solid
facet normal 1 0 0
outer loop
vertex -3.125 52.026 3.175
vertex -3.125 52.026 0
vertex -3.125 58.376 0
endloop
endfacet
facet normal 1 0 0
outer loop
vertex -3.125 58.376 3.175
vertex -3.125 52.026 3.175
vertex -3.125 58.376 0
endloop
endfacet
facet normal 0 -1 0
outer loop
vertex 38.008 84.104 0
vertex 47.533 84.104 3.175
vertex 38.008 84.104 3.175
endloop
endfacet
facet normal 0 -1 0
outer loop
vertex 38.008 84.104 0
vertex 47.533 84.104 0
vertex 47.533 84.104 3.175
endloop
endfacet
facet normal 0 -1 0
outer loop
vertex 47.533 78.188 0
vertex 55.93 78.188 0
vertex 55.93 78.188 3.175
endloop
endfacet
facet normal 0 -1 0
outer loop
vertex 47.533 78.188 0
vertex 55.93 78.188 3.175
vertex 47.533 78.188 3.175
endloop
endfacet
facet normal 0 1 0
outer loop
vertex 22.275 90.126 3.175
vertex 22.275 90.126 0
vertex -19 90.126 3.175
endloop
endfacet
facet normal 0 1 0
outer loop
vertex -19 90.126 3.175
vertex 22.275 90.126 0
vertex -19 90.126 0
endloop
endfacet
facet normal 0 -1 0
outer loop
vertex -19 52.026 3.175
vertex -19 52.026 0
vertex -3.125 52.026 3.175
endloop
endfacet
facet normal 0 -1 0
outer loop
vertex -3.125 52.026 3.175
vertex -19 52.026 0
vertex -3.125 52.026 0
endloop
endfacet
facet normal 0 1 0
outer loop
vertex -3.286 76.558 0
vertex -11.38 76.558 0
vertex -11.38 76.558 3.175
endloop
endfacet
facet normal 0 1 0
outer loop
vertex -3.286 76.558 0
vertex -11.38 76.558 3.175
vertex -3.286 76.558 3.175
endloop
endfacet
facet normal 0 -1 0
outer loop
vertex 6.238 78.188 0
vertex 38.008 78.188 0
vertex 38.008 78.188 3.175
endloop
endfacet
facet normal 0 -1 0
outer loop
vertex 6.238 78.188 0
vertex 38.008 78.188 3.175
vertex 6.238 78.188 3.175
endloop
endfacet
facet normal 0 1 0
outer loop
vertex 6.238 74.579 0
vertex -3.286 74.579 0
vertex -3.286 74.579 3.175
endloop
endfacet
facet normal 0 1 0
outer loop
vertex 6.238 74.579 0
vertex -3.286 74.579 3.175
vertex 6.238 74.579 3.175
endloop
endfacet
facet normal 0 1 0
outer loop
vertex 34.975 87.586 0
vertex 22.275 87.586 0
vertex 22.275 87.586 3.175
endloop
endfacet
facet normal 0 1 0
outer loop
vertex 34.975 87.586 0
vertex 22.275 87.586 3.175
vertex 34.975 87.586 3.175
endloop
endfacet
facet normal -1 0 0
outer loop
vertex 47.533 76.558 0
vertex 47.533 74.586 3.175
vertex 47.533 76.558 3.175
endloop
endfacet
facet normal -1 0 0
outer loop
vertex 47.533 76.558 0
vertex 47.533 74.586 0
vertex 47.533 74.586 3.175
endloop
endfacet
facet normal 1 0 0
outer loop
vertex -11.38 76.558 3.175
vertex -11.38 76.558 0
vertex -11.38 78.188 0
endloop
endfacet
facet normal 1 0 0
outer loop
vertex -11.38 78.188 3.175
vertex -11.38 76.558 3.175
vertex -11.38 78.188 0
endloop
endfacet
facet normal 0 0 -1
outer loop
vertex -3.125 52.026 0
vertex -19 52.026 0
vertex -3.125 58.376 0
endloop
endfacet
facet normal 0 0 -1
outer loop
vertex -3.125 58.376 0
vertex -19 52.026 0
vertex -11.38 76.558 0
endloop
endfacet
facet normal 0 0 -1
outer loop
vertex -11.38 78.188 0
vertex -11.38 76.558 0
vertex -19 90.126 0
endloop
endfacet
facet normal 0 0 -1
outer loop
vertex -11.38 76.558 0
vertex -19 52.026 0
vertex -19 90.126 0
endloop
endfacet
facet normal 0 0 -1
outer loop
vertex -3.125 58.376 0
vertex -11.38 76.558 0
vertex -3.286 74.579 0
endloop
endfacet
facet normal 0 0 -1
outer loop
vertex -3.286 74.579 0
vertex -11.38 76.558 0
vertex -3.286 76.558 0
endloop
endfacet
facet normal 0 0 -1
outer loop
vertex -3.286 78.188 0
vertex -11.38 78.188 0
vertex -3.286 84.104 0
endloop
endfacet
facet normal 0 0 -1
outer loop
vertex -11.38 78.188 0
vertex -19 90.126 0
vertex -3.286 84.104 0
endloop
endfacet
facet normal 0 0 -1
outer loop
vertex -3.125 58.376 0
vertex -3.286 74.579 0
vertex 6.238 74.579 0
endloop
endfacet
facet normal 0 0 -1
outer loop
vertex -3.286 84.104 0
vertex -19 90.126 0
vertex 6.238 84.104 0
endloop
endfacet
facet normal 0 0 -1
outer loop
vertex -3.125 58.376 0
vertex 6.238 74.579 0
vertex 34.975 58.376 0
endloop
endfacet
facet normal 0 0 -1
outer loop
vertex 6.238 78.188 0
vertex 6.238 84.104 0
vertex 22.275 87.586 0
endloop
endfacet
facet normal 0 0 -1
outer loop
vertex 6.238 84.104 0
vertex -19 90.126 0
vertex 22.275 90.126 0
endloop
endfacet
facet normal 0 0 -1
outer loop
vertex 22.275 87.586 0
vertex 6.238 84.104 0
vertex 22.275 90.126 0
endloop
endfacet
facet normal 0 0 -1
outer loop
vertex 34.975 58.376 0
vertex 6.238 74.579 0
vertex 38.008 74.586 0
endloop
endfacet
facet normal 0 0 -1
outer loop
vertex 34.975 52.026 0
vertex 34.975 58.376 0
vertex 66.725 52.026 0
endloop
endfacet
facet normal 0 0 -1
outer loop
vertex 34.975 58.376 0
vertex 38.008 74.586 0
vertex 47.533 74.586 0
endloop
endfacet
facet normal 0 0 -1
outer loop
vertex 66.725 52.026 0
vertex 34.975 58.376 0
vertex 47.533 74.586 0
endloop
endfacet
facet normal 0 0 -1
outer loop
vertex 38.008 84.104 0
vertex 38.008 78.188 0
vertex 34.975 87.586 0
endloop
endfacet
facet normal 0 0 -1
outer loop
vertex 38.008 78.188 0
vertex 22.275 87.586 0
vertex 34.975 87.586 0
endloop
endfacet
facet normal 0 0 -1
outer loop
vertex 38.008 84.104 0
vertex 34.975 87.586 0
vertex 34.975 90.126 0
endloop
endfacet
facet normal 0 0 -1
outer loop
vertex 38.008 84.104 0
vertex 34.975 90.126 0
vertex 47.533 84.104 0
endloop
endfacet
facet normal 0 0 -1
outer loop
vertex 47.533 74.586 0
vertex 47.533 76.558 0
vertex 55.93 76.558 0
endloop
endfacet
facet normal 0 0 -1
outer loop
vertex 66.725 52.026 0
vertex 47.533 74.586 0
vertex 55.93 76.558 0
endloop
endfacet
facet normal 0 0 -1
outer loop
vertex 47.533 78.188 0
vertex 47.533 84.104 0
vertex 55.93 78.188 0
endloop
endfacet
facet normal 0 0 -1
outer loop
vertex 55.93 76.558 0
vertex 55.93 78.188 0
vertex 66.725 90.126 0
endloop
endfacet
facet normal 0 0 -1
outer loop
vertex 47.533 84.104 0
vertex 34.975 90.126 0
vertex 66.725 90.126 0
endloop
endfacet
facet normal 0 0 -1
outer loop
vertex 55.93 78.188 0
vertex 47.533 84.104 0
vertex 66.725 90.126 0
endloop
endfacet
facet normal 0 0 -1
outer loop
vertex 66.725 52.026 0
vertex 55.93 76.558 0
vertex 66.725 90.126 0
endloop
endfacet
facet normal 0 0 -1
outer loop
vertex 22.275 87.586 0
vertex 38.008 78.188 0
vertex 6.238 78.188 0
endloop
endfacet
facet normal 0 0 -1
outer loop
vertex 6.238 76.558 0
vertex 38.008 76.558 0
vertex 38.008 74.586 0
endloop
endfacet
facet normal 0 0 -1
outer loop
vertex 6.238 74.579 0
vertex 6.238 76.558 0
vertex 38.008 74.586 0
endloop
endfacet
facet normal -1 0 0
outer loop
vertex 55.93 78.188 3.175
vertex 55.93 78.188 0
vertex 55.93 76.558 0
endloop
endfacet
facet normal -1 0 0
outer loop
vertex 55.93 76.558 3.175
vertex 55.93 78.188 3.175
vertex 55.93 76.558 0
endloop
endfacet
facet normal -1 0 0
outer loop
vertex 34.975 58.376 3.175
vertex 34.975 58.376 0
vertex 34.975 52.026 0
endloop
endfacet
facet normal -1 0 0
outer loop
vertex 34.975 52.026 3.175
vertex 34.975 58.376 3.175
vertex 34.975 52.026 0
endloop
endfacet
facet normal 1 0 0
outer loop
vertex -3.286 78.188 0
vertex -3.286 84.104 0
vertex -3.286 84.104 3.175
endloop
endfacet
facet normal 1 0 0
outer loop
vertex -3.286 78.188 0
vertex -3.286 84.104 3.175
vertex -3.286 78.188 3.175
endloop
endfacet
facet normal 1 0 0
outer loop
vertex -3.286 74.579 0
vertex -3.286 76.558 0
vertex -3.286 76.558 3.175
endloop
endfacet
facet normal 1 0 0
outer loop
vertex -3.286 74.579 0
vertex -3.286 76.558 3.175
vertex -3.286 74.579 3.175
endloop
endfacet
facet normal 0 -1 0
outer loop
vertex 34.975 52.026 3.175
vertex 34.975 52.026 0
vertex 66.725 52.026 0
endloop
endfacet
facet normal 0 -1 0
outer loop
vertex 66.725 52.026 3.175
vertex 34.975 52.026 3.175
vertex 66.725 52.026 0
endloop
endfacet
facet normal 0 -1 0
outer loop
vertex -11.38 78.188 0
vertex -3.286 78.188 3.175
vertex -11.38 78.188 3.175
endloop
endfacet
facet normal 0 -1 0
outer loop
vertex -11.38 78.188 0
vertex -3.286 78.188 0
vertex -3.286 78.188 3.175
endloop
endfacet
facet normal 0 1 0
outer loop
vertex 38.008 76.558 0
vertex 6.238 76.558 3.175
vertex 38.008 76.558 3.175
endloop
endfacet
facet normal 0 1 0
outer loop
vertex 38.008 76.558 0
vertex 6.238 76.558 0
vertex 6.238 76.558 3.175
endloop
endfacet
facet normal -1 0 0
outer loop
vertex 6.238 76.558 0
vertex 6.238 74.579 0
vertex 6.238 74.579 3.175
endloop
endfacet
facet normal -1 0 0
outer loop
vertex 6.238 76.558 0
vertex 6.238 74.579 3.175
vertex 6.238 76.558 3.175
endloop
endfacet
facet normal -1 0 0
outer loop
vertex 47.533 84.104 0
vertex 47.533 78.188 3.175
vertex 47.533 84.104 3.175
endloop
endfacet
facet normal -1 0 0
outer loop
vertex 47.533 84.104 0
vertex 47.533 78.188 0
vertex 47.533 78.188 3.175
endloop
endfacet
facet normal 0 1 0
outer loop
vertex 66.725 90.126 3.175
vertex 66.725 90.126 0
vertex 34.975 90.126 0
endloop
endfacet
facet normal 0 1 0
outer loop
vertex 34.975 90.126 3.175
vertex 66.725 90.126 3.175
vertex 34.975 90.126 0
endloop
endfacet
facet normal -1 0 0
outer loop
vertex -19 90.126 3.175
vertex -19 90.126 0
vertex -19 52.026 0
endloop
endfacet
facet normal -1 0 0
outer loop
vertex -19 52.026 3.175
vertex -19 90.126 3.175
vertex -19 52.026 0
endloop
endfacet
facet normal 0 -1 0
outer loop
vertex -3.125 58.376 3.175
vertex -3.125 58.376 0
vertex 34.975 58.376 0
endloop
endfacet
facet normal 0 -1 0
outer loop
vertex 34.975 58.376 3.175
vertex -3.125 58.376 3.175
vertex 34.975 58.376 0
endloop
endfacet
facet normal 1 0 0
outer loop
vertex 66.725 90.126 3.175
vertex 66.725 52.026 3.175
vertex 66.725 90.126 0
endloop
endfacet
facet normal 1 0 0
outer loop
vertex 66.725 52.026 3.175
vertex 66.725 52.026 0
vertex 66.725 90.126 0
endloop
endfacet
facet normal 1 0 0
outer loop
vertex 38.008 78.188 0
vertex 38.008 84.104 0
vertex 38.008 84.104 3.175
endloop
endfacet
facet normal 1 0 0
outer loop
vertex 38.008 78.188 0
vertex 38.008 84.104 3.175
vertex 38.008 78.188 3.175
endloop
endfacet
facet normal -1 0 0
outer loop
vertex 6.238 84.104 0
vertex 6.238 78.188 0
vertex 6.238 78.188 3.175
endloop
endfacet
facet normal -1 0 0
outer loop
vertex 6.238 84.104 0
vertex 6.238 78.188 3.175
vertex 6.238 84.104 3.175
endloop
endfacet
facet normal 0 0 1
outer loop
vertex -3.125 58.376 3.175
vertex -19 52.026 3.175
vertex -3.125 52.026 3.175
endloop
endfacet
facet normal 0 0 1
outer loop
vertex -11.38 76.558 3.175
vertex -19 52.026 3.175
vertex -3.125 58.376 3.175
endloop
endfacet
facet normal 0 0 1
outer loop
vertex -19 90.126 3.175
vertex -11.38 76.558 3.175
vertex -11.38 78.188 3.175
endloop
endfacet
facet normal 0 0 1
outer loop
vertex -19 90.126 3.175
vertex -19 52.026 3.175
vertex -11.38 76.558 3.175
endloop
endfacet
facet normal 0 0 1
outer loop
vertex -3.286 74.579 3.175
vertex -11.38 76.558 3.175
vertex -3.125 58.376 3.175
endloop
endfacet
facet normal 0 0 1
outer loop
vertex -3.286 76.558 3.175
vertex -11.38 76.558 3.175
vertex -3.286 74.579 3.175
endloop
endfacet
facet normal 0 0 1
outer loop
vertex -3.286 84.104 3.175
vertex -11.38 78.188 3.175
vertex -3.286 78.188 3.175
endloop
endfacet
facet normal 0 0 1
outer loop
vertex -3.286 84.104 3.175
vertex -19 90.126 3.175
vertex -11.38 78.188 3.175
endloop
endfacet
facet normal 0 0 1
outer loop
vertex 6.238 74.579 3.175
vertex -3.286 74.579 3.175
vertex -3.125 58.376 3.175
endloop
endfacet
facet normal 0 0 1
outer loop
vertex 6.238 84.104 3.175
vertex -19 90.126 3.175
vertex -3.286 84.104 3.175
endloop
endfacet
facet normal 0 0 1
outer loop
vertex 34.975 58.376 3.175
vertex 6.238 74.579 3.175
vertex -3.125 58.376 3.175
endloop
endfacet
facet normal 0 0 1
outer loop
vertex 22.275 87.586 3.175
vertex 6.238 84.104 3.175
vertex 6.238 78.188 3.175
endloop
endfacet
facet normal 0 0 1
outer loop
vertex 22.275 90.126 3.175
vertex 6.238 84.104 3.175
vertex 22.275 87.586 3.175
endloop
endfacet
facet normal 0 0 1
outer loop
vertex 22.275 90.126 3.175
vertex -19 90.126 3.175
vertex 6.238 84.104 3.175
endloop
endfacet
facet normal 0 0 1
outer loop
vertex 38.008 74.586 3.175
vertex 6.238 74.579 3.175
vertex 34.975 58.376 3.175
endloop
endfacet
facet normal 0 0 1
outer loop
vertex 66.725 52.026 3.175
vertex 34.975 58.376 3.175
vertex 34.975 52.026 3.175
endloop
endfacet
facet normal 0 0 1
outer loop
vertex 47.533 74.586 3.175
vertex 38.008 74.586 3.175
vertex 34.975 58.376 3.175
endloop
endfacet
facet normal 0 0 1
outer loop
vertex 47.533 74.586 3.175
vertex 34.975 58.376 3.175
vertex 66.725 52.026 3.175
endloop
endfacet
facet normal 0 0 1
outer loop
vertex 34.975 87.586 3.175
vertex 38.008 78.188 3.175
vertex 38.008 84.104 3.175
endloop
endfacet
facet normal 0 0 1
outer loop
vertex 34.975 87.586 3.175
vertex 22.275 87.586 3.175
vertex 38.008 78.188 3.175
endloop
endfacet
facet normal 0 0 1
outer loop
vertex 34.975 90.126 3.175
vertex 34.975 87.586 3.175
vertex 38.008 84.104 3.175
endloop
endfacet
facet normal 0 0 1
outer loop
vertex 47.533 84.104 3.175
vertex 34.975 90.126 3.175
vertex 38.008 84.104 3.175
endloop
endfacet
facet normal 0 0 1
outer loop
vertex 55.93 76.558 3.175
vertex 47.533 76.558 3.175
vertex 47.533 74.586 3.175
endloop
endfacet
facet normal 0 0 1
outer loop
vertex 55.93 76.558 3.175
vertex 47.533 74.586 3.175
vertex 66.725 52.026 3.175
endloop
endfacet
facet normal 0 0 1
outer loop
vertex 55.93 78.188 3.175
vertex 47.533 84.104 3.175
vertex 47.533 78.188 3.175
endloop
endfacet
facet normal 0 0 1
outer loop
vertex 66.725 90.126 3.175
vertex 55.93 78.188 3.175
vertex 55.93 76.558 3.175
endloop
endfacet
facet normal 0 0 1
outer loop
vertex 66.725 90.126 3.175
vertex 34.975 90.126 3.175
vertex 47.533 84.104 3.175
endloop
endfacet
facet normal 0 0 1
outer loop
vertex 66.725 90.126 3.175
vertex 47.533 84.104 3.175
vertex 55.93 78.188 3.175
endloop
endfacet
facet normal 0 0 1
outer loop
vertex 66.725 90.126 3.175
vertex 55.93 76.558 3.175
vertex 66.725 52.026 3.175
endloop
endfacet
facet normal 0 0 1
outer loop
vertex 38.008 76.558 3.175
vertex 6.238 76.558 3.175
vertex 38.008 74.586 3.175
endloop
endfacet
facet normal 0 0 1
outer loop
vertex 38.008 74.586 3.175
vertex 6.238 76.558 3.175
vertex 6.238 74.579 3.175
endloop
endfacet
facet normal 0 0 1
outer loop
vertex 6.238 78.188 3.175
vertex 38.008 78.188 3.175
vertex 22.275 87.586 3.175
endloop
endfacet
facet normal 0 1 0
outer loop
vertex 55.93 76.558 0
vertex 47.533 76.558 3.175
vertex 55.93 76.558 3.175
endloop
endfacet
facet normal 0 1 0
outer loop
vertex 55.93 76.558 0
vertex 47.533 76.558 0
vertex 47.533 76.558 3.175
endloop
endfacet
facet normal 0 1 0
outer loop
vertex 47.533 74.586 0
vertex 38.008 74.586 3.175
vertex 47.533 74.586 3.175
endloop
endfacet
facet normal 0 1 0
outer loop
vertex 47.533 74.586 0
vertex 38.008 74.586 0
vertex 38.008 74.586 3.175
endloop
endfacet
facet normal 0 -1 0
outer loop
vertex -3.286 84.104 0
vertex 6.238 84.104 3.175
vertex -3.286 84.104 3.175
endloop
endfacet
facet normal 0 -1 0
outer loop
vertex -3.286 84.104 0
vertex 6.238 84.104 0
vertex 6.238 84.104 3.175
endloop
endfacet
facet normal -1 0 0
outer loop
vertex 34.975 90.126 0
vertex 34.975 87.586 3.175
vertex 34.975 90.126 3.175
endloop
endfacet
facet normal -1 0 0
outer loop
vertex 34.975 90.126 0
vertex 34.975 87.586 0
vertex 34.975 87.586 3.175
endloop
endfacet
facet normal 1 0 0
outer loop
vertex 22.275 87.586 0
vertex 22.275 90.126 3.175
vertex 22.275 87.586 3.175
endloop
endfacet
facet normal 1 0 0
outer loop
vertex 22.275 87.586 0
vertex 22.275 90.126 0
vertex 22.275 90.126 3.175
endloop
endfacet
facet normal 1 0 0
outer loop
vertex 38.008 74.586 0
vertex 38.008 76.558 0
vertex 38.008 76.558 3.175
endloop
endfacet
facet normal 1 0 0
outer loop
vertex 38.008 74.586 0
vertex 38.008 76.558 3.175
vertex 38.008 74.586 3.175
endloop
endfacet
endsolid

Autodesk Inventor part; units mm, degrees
ref_plane "YZ Plane" through (0, 0, 0) normal (1, 0, 0) x (0, 1, 0)
ref_plane "XZ Plane" through (0, 0, 0) normal (0, 1, 0) x (-1, 0, 0)
ref_plane "XY Plane" through (0, 0, 0) normal (0, 0, 1) x (1, 0, 0)
sketch "Sketch1" plane through (0, 0, 0) normal (0, 0, 1) x (1, 0, 0)
  line L0 (66.7253, 90.1264) -> (-18.9997, 90.1264)
  line L1 (-18.9997, 90.1264) -> (-18.9997, 52.0264)
  line L2 (-18.9997, 52.0264) -> (66.7253, 52.0264)
  line L3 (66.7253, 52.0264) -> (66.7253, 90.1264)
  line L4 (66.7253, 78.1884) -> (-18.9997, 78.1884)
  line L5 (-18.9997, 78.1884) -> (-18.9997, 76.5584)
  line L6 (-18.9997, 76.5584) -> (66.7253, 76.5584)
  line L7 (66.7253, 76.5584) -> (66.7253, 78.1884)
  line L8 (55.9303, 78.1884) -> (55.9303, 76.5584)
  line L9 (-11.3797, 76.5584) -> (-11.3797, 78.1884)
  point P0 (0, 0)
  dimension "d0" = 38.1
  dimension "d1" = 85.725
  dimension "d2" = 1.63
  dimension "d3" = 11.938
  dimension "d6" = 67.31
  dimension "d7" = 7.62
extrude "Extrusion1" add sketch "Sketch1" along normal blind 3.175 contours L3 L4 L1 L0 | L3 L6 L8 L4 | L4 L9 L6 L1 | L3 L2 L1 L6
sketch "Sketch2" plane through (0, 0, 0) normal (0, 0, -1) x (-1, 0, 0)
  line L0 (-55.9303, 78.1884) -> (11.3797, 78.1884) projected
  line L1 (11.3797, 78.1884) -> (11.3797, 76.5584) projected
  line L2 (-6.2385, 84.1043) -> (3.2865, 84.1043)
  line L3 (3.2865, 84.1043) -> (3.2865, 74.5793)
  line L4 (3.2865, 74.5793) -> (-6.2385, 74.5793)
  line L5 (-6.2385, 74.5793) -> (-6.2385, 84.1043)
  line L6 (-47.533, 84.1043) -> (-38.008, 84.1043)
  line L7 (-38.008, 84.1043) -> (-38.008, 74.5865)
  line L8 (-38.008, 74.5865) -> (-47.533, 74.5865)
  line L9 (-47.533, 74.5865) -> (-47.533, 84.1043)
  line L10 (18.9997, 52.0264) -> (-66.7253, 52.0264) projected
  line L11 (-34.9753, 52.0264) -> (3.1247, 52.0264)
  line L12 (3.1247, 52.0264) -> (3.1247, 58.3764)
  line L13 (3.1247, 58.3764) -> (-34.9753, 58.3764)
  line L14 (-34.9753, 58.3764) -> (-34.9753, 52.0264)
  line L15 (-66.7253, 52.0264) -> (-66.7253, 90.1264) projected
  line L16 (-66.7253, 90.1264) -> (18.9997, 90.1264) projected
  line L17 (-34.9753, 90.1264) -> (-22.2753, 90.1264)
  line L18 (-22.2753, 90.1264) -> (-22.2753, 87.5864)
  line L19 (-22.2753, 87.5864) -> (-34.9753, 87.5864)
  line L20 (-34.9753, 87.5864) -> (-34.9753, 90.1264)
  point P0 (0, 0)
  dimension "d8" = 9.525
  dimension "d9" = 9.5177
  dimension "d10" = 9.525
  dimension "d11" = 9.525
  dimension "d12" = 31.7695
  dimension "d13" = 5.9159
  dimension "d14" = 8.0932
  dimension "d17" = 6.35
  dimension "d18" = 38.1
  dimension "d20" = 2.54
  dimension "d21" = 12.7
  dimension "d22" = 31.75
  dimension "d23" = 31.75
extrude "Extrusion2" cut sketch "Sketch2" against normal blind 3.175
properties part number "RearBulkhead"
